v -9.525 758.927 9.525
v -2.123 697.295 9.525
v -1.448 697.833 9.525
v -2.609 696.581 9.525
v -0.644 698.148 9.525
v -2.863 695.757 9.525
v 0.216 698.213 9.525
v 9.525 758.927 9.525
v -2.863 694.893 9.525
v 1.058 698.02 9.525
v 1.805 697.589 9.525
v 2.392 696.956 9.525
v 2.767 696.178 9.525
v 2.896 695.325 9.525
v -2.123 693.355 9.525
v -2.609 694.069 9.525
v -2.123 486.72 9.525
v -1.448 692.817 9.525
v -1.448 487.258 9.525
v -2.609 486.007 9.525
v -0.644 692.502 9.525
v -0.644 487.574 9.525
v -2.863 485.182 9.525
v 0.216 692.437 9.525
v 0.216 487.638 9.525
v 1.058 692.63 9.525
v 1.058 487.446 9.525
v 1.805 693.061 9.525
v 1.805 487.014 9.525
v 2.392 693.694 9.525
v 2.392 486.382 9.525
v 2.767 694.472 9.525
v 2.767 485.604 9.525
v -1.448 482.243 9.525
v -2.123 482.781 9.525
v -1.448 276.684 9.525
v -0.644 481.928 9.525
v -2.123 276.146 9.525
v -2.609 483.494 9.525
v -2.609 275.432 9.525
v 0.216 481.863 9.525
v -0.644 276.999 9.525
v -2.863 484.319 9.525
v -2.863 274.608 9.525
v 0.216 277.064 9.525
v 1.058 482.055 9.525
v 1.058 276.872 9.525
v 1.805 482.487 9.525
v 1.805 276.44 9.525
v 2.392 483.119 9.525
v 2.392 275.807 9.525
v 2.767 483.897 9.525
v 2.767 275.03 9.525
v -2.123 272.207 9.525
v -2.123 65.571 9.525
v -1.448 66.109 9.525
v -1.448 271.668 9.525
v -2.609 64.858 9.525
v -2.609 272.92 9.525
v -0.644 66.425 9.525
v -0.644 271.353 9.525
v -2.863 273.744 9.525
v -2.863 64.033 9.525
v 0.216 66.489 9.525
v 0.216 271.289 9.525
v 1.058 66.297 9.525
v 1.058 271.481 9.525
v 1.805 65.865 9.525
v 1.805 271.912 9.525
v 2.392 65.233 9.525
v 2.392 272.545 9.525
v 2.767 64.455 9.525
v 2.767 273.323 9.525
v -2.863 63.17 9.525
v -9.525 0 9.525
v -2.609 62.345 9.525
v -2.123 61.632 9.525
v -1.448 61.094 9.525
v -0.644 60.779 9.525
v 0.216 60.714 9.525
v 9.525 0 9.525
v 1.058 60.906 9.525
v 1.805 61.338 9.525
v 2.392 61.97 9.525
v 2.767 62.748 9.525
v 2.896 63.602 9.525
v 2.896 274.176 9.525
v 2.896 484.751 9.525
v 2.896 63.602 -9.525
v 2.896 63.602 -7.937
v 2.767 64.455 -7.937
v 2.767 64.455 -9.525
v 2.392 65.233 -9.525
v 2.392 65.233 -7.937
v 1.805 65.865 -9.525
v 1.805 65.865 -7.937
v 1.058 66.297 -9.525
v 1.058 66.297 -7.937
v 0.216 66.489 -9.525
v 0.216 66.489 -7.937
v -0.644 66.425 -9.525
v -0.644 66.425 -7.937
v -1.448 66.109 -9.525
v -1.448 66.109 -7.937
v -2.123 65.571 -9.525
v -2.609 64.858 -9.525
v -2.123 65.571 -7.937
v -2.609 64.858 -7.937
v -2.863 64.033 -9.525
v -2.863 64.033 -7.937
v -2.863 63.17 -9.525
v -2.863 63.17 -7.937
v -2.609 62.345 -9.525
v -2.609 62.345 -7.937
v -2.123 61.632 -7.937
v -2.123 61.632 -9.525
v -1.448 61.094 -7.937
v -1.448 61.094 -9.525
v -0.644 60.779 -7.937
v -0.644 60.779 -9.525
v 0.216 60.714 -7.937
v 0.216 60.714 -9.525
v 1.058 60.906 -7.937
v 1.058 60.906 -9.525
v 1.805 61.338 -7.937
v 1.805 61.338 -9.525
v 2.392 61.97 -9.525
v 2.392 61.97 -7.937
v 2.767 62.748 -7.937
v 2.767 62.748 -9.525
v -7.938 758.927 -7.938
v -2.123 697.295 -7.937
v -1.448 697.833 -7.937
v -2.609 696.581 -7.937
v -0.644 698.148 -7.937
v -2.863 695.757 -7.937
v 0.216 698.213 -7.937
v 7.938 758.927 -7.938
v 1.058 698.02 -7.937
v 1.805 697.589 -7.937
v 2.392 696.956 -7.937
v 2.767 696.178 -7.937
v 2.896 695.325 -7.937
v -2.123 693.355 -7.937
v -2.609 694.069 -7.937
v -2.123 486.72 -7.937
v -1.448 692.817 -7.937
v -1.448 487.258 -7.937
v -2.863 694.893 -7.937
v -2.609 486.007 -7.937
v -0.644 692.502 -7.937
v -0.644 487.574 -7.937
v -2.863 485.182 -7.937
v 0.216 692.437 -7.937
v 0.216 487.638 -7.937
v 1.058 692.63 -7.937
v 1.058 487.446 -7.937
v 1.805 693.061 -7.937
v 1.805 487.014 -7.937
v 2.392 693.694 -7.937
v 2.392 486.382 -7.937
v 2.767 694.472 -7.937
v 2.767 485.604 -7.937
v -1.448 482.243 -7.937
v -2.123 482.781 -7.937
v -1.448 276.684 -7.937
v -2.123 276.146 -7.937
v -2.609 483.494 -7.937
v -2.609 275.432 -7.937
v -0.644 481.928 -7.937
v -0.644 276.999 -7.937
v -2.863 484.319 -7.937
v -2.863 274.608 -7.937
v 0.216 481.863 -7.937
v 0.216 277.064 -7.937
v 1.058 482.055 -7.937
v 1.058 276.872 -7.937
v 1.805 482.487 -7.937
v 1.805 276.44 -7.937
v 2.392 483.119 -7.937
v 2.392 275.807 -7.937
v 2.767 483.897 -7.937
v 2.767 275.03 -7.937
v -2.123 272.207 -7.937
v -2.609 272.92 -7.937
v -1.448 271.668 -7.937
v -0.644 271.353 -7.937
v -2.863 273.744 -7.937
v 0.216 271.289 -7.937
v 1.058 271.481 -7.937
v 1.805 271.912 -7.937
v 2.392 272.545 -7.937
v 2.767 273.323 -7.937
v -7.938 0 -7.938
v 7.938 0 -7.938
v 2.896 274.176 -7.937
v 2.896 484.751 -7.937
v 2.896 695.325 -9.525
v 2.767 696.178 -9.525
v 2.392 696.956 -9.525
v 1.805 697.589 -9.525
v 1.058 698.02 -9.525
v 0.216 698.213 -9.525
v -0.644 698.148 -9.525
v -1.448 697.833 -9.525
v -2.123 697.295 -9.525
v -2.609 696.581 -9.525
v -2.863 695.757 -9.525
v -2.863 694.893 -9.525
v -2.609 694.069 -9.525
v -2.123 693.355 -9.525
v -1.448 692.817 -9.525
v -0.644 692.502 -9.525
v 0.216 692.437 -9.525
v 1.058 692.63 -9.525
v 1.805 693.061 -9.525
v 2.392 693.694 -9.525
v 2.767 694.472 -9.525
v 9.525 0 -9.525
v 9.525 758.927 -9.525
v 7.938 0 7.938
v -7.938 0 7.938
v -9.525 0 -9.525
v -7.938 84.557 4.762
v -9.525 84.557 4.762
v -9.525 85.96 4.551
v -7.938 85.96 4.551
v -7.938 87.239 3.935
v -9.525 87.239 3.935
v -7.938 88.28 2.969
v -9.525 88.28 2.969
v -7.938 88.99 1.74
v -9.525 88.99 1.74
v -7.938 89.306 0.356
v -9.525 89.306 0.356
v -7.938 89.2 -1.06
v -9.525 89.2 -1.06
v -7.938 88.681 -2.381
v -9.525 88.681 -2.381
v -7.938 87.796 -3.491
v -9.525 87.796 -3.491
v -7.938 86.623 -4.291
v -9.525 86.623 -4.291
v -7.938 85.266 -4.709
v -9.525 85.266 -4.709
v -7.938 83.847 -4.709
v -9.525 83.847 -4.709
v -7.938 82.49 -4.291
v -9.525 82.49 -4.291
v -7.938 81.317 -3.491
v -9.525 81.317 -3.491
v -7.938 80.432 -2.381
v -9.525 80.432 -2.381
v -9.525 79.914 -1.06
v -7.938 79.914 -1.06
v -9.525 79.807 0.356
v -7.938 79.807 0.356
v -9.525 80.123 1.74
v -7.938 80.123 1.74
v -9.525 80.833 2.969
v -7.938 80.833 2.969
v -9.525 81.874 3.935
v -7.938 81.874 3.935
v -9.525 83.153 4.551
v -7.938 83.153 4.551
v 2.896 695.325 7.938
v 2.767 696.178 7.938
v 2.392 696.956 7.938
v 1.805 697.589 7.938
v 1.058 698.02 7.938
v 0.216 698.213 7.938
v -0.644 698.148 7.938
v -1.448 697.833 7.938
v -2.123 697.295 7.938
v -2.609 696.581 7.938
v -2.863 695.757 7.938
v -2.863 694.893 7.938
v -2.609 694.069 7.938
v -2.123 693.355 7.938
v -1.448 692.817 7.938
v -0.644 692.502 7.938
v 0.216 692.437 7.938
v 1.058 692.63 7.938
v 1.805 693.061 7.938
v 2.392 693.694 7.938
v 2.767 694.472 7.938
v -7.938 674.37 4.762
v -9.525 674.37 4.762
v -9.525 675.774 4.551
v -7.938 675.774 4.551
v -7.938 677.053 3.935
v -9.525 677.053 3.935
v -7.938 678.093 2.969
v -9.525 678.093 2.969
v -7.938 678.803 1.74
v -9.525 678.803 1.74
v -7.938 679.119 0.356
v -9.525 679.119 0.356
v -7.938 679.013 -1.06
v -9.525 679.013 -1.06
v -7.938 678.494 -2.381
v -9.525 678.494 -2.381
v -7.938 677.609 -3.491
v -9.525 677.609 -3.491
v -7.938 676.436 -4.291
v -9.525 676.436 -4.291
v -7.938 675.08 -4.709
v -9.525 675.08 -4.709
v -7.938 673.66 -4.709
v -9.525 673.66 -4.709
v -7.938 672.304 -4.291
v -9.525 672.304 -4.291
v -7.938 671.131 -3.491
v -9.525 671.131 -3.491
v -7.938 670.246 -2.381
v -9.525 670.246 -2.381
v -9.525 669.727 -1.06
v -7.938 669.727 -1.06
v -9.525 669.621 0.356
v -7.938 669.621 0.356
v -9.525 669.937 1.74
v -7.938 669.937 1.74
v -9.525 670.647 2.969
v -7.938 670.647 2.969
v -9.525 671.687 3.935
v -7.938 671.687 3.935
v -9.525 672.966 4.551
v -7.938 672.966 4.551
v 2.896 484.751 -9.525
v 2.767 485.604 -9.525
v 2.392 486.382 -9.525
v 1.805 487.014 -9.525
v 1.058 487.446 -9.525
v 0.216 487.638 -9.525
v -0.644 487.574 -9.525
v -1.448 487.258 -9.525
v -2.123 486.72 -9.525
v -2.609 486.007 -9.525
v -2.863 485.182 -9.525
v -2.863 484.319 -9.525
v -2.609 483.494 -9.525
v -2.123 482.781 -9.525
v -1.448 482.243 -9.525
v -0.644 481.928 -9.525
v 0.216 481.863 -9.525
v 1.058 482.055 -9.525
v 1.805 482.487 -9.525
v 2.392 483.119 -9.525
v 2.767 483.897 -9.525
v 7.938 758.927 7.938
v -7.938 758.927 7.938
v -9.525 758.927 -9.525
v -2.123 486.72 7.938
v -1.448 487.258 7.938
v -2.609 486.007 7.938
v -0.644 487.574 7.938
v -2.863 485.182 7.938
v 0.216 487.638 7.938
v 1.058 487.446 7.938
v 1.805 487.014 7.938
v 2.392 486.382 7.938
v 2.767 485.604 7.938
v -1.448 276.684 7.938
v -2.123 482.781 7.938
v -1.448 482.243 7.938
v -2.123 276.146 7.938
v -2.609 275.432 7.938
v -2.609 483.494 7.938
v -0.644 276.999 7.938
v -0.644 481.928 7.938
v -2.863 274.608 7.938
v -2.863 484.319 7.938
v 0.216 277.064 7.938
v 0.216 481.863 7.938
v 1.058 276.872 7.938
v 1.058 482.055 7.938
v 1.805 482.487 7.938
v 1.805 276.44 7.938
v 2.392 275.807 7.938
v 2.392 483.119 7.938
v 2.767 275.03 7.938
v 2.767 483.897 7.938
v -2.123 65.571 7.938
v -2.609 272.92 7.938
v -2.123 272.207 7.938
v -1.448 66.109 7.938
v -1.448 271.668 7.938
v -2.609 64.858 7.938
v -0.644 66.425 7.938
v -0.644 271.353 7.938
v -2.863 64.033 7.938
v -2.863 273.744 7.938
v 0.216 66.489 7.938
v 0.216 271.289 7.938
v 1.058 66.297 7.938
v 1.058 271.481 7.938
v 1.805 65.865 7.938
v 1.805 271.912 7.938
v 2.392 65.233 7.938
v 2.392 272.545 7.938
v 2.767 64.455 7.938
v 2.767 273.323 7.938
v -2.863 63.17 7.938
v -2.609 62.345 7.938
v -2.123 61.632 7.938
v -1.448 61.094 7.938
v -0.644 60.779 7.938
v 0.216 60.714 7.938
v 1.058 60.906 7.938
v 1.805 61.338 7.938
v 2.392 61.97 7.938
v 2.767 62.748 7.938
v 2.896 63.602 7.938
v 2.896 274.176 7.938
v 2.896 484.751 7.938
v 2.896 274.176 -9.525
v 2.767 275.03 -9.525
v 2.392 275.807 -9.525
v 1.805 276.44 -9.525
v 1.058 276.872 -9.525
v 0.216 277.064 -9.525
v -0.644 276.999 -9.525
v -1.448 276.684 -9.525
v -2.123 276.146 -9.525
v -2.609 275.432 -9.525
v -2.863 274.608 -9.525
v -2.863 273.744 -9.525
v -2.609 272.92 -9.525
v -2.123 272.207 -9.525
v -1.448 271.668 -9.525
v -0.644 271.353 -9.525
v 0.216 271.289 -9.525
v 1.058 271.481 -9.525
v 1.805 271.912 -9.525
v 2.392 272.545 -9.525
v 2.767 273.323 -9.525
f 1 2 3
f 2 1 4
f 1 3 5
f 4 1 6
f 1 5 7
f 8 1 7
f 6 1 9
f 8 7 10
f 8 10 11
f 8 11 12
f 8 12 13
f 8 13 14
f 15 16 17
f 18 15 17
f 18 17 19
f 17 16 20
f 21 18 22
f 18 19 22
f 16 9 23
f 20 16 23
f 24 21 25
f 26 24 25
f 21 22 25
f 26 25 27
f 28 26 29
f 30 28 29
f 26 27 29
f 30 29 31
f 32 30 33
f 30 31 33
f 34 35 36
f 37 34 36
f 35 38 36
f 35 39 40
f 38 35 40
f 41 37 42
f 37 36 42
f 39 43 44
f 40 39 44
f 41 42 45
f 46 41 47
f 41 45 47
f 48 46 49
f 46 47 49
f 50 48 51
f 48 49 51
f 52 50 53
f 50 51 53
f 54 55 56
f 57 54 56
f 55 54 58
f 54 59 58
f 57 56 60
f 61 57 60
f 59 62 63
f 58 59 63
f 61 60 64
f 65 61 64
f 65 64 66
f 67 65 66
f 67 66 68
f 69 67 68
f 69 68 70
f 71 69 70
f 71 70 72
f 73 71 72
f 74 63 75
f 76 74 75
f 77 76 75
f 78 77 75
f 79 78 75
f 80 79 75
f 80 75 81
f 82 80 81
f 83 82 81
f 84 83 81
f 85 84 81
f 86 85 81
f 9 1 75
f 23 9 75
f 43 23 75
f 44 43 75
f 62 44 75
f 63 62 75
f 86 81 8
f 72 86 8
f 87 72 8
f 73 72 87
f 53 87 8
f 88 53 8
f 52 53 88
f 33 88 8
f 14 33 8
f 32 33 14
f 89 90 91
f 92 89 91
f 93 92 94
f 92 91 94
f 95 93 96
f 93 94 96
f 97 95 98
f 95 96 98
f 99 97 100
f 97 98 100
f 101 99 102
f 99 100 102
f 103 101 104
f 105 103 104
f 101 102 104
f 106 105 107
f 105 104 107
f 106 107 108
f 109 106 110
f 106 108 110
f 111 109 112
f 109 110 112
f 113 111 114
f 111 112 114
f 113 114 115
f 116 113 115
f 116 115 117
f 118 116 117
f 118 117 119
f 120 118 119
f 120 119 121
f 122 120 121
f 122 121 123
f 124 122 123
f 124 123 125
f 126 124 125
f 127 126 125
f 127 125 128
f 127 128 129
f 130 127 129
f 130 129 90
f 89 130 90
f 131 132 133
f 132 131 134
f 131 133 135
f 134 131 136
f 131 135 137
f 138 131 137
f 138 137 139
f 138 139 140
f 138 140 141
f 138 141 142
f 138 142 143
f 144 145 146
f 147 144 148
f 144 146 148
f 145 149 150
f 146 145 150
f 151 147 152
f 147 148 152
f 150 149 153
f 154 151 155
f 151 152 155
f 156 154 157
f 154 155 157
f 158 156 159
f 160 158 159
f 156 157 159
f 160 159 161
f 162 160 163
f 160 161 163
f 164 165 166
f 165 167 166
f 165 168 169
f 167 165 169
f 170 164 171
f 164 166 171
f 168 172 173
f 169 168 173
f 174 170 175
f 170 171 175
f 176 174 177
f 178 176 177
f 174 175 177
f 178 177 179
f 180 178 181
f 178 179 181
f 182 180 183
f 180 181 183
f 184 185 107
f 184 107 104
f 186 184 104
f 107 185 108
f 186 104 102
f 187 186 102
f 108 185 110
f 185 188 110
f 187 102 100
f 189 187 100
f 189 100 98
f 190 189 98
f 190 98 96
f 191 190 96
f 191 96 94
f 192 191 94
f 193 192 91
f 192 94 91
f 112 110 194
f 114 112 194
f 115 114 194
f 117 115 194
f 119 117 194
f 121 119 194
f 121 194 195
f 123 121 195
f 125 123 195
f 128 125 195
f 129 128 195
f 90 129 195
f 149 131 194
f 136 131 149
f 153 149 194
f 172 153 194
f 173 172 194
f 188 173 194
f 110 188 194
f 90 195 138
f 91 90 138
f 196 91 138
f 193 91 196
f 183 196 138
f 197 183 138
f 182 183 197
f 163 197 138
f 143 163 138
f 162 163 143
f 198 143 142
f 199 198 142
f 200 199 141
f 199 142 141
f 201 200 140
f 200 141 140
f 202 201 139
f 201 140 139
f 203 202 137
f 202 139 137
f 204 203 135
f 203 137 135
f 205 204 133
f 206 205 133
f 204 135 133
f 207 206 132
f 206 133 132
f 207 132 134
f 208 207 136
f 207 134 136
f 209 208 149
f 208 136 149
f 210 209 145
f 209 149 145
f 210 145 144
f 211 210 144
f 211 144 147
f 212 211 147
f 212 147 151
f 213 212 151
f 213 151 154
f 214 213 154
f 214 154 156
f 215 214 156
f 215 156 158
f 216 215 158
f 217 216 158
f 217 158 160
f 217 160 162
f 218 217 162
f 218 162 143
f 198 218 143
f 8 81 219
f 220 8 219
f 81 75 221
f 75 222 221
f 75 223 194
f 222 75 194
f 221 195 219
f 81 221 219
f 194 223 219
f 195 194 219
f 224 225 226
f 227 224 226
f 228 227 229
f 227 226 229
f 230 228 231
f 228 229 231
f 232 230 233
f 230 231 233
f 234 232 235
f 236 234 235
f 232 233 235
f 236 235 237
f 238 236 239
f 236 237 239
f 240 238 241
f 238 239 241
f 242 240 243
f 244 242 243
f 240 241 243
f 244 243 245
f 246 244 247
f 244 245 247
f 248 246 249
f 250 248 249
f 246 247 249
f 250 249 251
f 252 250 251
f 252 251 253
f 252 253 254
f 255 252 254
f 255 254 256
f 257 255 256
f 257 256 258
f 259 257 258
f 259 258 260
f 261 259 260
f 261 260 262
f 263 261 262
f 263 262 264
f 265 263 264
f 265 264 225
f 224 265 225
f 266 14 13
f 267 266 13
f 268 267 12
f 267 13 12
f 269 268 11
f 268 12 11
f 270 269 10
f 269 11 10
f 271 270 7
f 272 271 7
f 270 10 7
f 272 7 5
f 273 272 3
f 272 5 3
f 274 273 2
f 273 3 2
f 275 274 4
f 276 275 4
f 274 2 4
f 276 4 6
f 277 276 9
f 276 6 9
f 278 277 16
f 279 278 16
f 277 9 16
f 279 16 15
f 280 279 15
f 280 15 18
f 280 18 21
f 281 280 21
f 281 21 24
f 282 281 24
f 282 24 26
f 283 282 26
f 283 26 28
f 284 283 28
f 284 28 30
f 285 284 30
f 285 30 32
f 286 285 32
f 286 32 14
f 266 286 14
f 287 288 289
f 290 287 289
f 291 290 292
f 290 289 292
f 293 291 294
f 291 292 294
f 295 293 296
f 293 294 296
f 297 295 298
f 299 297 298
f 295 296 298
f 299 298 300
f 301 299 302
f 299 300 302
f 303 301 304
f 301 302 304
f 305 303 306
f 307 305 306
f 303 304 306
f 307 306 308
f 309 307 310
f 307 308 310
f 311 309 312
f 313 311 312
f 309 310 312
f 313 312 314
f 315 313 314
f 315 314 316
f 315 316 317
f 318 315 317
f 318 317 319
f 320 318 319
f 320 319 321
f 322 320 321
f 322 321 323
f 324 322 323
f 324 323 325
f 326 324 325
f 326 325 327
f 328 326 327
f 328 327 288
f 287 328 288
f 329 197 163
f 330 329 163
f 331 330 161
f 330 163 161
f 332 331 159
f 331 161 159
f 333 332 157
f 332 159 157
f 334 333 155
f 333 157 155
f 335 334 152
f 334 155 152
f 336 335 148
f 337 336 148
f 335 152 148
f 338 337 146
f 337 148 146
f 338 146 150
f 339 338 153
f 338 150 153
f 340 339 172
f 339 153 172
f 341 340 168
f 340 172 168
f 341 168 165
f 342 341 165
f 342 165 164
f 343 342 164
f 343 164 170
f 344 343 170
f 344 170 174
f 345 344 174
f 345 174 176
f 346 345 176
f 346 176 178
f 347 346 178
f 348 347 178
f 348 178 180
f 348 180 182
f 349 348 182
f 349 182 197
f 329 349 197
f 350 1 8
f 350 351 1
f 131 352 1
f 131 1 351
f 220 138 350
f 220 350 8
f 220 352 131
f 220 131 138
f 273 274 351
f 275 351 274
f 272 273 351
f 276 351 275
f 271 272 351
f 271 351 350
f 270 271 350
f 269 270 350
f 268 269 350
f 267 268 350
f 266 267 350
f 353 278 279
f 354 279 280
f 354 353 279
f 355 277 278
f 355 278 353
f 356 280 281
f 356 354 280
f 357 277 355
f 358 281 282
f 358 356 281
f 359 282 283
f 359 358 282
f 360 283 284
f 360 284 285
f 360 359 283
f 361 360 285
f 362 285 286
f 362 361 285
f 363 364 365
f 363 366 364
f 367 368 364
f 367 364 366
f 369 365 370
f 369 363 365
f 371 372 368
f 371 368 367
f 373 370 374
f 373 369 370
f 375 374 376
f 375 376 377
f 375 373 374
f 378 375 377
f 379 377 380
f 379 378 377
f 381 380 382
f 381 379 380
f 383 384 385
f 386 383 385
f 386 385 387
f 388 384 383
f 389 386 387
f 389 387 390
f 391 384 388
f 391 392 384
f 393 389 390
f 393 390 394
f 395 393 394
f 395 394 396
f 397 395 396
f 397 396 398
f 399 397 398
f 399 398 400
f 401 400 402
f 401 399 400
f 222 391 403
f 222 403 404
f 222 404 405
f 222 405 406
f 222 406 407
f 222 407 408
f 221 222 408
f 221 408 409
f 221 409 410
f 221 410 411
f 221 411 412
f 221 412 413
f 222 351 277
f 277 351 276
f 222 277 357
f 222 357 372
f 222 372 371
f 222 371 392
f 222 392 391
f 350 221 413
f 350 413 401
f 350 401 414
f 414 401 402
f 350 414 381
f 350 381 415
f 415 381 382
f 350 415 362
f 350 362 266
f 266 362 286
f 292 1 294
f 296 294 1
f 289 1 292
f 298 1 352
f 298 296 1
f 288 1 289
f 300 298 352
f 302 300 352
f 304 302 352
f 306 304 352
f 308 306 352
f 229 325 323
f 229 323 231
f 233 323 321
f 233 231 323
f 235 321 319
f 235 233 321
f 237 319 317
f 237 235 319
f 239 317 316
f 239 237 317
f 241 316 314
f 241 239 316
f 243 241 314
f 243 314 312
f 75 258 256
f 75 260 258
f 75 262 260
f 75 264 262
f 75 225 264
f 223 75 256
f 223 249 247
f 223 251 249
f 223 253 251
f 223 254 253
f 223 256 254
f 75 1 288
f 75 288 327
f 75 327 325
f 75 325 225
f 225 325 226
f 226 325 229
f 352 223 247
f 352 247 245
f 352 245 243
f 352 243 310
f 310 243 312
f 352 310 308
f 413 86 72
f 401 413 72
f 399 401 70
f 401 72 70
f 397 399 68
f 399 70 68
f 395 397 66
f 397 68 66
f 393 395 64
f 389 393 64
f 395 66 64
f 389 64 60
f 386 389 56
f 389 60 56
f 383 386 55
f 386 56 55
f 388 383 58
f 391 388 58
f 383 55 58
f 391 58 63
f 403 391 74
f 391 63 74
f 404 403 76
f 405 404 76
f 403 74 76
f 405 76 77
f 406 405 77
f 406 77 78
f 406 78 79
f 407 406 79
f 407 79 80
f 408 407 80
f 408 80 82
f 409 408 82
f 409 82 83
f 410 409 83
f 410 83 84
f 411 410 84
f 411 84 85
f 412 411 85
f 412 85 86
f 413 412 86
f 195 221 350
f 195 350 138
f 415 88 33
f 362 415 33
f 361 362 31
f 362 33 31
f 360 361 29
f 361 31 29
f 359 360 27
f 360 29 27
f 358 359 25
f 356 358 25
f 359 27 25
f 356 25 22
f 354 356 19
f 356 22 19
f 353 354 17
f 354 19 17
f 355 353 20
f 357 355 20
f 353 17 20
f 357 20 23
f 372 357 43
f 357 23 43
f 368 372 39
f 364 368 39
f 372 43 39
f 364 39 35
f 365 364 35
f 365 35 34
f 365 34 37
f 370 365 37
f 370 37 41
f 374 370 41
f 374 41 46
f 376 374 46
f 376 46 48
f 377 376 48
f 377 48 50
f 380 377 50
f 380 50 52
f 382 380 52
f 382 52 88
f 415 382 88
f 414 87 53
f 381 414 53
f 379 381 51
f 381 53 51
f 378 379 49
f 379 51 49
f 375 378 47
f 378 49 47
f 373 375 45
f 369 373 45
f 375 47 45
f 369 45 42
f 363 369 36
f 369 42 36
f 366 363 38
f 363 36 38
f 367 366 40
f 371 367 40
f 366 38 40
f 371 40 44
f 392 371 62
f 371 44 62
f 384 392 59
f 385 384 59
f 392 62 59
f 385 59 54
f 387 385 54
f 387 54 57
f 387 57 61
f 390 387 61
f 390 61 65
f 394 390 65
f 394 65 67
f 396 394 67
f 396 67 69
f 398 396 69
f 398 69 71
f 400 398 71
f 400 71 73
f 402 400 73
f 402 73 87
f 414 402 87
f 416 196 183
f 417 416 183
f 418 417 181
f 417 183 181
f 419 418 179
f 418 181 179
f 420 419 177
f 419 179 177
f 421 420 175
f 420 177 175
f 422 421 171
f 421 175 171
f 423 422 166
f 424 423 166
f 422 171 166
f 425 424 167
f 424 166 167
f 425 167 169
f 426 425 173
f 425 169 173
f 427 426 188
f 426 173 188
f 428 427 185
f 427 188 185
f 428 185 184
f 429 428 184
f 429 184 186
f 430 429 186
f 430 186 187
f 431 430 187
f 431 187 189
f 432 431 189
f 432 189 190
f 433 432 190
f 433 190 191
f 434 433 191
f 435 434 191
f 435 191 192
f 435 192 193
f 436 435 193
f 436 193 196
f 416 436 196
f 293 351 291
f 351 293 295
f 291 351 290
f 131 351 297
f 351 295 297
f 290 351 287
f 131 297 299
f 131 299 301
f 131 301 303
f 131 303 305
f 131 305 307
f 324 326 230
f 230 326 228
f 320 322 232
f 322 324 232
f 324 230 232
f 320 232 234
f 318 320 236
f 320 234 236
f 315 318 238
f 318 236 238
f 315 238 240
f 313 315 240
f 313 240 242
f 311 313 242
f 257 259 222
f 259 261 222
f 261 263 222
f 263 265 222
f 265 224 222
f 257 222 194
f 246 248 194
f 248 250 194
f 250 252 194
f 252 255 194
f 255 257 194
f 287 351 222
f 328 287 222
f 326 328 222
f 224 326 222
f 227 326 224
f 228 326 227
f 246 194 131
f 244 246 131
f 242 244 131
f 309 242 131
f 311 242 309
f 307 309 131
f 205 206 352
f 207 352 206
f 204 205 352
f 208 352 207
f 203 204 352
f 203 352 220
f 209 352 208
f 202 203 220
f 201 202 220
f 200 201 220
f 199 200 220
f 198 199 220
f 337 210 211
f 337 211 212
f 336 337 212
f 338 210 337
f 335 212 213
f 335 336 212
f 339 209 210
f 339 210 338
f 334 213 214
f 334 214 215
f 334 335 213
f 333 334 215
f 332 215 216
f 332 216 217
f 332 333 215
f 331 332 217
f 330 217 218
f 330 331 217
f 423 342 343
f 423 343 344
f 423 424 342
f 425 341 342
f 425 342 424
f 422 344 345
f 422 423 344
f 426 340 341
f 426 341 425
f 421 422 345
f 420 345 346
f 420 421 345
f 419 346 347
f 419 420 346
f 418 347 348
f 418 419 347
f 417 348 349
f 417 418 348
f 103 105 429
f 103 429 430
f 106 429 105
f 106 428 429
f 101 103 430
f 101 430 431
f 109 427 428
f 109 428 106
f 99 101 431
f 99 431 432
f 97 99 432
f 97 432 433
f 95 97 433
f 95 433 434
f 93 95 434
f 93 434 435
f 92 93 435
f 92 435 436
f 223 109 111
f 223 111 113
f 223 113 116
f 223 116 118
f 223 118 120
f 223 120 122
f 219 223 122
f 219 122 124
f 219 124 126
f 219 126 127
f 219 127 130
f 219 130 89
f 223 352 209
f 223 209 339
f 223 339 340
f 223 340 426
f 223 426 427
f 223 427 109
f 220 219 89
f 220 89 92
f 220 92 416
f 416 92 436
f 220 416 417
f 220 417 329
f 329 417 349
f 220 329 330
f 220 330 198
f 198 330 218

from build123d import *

# Parameters (mm, degrees)
SKETCH1_W                      = 19.05
SKETCH1_H                      = 19.05
SKETCH1_W_2                    = 15.875
SKETCH1_H_2                    = 15.875
TUBE_DEPTH                     = 758.9266
SKETCH2_R                      = 2.8956
SIDE_WALL_HOLES_DEPTH          = 20.05
LPATTERN1_COUNT                = 4
LPATTERN1_PITCH                = 210.574466667
CUT_EXTRUDE1_REACH             = 21.05
SKETCH3_R                      = 4.7625
CUT_EXTRUDE1_DIRECTION_2_DEPTH = 1


with BuildPart() as part:
    # Sketch1 → Tube (new body)
    with BuildSketch(Plane(origin=(0, 0, 0), x_dir=(1, 0, 0), z_dir=(0, 1, 0))):
        Rectangle(SKETCH1_W, SKETCH1_H)
        Rectangle(SKETCH1_W_2, SKETCH1_H_2, mode=Mode.SUBTRACT)
    extrude(amount=TUBE_DEPTH)

    # Sketch2 → Side Wall Holes (cut, through all)
    with BuildSketch(Plane.XY.offset(9.525)):
        with Locations((0, 695.325)):
            Circle(SKETCH2_R)
    side_wall_holes = extrude(amount=-SIDE_WALL_HOLES_DEPTH, mode=Mode.SUBTRACT)

    # LPattern1: Side Wall Holes ×4
    with Locations(*[(0, -i * LPATTERN1_PITCH, 0) for i in range(1, LPATTERN1_COUNT)]):
        add(side_wall_holes, mode=Mode.SUBTRACT)

    # Sketch3 → Cut-Extrude1 (cut, up to next)
    with BuildSketch(Plane.ZY.offset(9.525), mode=Mode.PRIVATE) as cut_extrude1_sk1:
        with Locations((0, 674.37)):
            Circle(SKETCH3_R)
    cut_extrude1_tool1 = extrude(cut_extrude1_sk1.sketch, amount=-CUT_EXTRUDE1_REACH, mode=Mode.PRIVATE) & part.part
    add(cut_extrude1_tool1.solids().sort_by_distance((-9.525, 674.37, 0))[0], mode=Mode.SUBTRACT)
    # Sketch3 → Cut-Extrude1 (cut, up to next)
    with BuildSketch(Plane.ZY.offset(9.525), mode=Mode.PRIVATE) as cut_extrude1_sk2:
        with Locations((0, 84.5566)):
            Circle(SKETCH3_R)
    cut_extrude1_tool2 = extrude(cut_extrude1_sk2.sketch, amount=-CUT_EXTRUDE1_REACH, mode=Mode.PRIVATE) & part.part
    add(cut_extrude1_tool2.solids().sort_by_distance((-9.525, 84.5566, 0))[0], mode=Mode.SUBTRACT)

    # Sketch3 → Cut-Extrude1 direction 2 (cut)
    with BuildSketch(Plane.ZY.offset(9.525)):
        with Locations((0, 674.37)):
            Circle(SKETCH3_R)
        with Locations((0, 84.5566)):
            Circle(SKETCH3_R)
    extrude(amount=CUT_EXTRUDE1_DIRECTION_2_DEPTH, mode=Mode.SUBTRACT)


solid = part.part
